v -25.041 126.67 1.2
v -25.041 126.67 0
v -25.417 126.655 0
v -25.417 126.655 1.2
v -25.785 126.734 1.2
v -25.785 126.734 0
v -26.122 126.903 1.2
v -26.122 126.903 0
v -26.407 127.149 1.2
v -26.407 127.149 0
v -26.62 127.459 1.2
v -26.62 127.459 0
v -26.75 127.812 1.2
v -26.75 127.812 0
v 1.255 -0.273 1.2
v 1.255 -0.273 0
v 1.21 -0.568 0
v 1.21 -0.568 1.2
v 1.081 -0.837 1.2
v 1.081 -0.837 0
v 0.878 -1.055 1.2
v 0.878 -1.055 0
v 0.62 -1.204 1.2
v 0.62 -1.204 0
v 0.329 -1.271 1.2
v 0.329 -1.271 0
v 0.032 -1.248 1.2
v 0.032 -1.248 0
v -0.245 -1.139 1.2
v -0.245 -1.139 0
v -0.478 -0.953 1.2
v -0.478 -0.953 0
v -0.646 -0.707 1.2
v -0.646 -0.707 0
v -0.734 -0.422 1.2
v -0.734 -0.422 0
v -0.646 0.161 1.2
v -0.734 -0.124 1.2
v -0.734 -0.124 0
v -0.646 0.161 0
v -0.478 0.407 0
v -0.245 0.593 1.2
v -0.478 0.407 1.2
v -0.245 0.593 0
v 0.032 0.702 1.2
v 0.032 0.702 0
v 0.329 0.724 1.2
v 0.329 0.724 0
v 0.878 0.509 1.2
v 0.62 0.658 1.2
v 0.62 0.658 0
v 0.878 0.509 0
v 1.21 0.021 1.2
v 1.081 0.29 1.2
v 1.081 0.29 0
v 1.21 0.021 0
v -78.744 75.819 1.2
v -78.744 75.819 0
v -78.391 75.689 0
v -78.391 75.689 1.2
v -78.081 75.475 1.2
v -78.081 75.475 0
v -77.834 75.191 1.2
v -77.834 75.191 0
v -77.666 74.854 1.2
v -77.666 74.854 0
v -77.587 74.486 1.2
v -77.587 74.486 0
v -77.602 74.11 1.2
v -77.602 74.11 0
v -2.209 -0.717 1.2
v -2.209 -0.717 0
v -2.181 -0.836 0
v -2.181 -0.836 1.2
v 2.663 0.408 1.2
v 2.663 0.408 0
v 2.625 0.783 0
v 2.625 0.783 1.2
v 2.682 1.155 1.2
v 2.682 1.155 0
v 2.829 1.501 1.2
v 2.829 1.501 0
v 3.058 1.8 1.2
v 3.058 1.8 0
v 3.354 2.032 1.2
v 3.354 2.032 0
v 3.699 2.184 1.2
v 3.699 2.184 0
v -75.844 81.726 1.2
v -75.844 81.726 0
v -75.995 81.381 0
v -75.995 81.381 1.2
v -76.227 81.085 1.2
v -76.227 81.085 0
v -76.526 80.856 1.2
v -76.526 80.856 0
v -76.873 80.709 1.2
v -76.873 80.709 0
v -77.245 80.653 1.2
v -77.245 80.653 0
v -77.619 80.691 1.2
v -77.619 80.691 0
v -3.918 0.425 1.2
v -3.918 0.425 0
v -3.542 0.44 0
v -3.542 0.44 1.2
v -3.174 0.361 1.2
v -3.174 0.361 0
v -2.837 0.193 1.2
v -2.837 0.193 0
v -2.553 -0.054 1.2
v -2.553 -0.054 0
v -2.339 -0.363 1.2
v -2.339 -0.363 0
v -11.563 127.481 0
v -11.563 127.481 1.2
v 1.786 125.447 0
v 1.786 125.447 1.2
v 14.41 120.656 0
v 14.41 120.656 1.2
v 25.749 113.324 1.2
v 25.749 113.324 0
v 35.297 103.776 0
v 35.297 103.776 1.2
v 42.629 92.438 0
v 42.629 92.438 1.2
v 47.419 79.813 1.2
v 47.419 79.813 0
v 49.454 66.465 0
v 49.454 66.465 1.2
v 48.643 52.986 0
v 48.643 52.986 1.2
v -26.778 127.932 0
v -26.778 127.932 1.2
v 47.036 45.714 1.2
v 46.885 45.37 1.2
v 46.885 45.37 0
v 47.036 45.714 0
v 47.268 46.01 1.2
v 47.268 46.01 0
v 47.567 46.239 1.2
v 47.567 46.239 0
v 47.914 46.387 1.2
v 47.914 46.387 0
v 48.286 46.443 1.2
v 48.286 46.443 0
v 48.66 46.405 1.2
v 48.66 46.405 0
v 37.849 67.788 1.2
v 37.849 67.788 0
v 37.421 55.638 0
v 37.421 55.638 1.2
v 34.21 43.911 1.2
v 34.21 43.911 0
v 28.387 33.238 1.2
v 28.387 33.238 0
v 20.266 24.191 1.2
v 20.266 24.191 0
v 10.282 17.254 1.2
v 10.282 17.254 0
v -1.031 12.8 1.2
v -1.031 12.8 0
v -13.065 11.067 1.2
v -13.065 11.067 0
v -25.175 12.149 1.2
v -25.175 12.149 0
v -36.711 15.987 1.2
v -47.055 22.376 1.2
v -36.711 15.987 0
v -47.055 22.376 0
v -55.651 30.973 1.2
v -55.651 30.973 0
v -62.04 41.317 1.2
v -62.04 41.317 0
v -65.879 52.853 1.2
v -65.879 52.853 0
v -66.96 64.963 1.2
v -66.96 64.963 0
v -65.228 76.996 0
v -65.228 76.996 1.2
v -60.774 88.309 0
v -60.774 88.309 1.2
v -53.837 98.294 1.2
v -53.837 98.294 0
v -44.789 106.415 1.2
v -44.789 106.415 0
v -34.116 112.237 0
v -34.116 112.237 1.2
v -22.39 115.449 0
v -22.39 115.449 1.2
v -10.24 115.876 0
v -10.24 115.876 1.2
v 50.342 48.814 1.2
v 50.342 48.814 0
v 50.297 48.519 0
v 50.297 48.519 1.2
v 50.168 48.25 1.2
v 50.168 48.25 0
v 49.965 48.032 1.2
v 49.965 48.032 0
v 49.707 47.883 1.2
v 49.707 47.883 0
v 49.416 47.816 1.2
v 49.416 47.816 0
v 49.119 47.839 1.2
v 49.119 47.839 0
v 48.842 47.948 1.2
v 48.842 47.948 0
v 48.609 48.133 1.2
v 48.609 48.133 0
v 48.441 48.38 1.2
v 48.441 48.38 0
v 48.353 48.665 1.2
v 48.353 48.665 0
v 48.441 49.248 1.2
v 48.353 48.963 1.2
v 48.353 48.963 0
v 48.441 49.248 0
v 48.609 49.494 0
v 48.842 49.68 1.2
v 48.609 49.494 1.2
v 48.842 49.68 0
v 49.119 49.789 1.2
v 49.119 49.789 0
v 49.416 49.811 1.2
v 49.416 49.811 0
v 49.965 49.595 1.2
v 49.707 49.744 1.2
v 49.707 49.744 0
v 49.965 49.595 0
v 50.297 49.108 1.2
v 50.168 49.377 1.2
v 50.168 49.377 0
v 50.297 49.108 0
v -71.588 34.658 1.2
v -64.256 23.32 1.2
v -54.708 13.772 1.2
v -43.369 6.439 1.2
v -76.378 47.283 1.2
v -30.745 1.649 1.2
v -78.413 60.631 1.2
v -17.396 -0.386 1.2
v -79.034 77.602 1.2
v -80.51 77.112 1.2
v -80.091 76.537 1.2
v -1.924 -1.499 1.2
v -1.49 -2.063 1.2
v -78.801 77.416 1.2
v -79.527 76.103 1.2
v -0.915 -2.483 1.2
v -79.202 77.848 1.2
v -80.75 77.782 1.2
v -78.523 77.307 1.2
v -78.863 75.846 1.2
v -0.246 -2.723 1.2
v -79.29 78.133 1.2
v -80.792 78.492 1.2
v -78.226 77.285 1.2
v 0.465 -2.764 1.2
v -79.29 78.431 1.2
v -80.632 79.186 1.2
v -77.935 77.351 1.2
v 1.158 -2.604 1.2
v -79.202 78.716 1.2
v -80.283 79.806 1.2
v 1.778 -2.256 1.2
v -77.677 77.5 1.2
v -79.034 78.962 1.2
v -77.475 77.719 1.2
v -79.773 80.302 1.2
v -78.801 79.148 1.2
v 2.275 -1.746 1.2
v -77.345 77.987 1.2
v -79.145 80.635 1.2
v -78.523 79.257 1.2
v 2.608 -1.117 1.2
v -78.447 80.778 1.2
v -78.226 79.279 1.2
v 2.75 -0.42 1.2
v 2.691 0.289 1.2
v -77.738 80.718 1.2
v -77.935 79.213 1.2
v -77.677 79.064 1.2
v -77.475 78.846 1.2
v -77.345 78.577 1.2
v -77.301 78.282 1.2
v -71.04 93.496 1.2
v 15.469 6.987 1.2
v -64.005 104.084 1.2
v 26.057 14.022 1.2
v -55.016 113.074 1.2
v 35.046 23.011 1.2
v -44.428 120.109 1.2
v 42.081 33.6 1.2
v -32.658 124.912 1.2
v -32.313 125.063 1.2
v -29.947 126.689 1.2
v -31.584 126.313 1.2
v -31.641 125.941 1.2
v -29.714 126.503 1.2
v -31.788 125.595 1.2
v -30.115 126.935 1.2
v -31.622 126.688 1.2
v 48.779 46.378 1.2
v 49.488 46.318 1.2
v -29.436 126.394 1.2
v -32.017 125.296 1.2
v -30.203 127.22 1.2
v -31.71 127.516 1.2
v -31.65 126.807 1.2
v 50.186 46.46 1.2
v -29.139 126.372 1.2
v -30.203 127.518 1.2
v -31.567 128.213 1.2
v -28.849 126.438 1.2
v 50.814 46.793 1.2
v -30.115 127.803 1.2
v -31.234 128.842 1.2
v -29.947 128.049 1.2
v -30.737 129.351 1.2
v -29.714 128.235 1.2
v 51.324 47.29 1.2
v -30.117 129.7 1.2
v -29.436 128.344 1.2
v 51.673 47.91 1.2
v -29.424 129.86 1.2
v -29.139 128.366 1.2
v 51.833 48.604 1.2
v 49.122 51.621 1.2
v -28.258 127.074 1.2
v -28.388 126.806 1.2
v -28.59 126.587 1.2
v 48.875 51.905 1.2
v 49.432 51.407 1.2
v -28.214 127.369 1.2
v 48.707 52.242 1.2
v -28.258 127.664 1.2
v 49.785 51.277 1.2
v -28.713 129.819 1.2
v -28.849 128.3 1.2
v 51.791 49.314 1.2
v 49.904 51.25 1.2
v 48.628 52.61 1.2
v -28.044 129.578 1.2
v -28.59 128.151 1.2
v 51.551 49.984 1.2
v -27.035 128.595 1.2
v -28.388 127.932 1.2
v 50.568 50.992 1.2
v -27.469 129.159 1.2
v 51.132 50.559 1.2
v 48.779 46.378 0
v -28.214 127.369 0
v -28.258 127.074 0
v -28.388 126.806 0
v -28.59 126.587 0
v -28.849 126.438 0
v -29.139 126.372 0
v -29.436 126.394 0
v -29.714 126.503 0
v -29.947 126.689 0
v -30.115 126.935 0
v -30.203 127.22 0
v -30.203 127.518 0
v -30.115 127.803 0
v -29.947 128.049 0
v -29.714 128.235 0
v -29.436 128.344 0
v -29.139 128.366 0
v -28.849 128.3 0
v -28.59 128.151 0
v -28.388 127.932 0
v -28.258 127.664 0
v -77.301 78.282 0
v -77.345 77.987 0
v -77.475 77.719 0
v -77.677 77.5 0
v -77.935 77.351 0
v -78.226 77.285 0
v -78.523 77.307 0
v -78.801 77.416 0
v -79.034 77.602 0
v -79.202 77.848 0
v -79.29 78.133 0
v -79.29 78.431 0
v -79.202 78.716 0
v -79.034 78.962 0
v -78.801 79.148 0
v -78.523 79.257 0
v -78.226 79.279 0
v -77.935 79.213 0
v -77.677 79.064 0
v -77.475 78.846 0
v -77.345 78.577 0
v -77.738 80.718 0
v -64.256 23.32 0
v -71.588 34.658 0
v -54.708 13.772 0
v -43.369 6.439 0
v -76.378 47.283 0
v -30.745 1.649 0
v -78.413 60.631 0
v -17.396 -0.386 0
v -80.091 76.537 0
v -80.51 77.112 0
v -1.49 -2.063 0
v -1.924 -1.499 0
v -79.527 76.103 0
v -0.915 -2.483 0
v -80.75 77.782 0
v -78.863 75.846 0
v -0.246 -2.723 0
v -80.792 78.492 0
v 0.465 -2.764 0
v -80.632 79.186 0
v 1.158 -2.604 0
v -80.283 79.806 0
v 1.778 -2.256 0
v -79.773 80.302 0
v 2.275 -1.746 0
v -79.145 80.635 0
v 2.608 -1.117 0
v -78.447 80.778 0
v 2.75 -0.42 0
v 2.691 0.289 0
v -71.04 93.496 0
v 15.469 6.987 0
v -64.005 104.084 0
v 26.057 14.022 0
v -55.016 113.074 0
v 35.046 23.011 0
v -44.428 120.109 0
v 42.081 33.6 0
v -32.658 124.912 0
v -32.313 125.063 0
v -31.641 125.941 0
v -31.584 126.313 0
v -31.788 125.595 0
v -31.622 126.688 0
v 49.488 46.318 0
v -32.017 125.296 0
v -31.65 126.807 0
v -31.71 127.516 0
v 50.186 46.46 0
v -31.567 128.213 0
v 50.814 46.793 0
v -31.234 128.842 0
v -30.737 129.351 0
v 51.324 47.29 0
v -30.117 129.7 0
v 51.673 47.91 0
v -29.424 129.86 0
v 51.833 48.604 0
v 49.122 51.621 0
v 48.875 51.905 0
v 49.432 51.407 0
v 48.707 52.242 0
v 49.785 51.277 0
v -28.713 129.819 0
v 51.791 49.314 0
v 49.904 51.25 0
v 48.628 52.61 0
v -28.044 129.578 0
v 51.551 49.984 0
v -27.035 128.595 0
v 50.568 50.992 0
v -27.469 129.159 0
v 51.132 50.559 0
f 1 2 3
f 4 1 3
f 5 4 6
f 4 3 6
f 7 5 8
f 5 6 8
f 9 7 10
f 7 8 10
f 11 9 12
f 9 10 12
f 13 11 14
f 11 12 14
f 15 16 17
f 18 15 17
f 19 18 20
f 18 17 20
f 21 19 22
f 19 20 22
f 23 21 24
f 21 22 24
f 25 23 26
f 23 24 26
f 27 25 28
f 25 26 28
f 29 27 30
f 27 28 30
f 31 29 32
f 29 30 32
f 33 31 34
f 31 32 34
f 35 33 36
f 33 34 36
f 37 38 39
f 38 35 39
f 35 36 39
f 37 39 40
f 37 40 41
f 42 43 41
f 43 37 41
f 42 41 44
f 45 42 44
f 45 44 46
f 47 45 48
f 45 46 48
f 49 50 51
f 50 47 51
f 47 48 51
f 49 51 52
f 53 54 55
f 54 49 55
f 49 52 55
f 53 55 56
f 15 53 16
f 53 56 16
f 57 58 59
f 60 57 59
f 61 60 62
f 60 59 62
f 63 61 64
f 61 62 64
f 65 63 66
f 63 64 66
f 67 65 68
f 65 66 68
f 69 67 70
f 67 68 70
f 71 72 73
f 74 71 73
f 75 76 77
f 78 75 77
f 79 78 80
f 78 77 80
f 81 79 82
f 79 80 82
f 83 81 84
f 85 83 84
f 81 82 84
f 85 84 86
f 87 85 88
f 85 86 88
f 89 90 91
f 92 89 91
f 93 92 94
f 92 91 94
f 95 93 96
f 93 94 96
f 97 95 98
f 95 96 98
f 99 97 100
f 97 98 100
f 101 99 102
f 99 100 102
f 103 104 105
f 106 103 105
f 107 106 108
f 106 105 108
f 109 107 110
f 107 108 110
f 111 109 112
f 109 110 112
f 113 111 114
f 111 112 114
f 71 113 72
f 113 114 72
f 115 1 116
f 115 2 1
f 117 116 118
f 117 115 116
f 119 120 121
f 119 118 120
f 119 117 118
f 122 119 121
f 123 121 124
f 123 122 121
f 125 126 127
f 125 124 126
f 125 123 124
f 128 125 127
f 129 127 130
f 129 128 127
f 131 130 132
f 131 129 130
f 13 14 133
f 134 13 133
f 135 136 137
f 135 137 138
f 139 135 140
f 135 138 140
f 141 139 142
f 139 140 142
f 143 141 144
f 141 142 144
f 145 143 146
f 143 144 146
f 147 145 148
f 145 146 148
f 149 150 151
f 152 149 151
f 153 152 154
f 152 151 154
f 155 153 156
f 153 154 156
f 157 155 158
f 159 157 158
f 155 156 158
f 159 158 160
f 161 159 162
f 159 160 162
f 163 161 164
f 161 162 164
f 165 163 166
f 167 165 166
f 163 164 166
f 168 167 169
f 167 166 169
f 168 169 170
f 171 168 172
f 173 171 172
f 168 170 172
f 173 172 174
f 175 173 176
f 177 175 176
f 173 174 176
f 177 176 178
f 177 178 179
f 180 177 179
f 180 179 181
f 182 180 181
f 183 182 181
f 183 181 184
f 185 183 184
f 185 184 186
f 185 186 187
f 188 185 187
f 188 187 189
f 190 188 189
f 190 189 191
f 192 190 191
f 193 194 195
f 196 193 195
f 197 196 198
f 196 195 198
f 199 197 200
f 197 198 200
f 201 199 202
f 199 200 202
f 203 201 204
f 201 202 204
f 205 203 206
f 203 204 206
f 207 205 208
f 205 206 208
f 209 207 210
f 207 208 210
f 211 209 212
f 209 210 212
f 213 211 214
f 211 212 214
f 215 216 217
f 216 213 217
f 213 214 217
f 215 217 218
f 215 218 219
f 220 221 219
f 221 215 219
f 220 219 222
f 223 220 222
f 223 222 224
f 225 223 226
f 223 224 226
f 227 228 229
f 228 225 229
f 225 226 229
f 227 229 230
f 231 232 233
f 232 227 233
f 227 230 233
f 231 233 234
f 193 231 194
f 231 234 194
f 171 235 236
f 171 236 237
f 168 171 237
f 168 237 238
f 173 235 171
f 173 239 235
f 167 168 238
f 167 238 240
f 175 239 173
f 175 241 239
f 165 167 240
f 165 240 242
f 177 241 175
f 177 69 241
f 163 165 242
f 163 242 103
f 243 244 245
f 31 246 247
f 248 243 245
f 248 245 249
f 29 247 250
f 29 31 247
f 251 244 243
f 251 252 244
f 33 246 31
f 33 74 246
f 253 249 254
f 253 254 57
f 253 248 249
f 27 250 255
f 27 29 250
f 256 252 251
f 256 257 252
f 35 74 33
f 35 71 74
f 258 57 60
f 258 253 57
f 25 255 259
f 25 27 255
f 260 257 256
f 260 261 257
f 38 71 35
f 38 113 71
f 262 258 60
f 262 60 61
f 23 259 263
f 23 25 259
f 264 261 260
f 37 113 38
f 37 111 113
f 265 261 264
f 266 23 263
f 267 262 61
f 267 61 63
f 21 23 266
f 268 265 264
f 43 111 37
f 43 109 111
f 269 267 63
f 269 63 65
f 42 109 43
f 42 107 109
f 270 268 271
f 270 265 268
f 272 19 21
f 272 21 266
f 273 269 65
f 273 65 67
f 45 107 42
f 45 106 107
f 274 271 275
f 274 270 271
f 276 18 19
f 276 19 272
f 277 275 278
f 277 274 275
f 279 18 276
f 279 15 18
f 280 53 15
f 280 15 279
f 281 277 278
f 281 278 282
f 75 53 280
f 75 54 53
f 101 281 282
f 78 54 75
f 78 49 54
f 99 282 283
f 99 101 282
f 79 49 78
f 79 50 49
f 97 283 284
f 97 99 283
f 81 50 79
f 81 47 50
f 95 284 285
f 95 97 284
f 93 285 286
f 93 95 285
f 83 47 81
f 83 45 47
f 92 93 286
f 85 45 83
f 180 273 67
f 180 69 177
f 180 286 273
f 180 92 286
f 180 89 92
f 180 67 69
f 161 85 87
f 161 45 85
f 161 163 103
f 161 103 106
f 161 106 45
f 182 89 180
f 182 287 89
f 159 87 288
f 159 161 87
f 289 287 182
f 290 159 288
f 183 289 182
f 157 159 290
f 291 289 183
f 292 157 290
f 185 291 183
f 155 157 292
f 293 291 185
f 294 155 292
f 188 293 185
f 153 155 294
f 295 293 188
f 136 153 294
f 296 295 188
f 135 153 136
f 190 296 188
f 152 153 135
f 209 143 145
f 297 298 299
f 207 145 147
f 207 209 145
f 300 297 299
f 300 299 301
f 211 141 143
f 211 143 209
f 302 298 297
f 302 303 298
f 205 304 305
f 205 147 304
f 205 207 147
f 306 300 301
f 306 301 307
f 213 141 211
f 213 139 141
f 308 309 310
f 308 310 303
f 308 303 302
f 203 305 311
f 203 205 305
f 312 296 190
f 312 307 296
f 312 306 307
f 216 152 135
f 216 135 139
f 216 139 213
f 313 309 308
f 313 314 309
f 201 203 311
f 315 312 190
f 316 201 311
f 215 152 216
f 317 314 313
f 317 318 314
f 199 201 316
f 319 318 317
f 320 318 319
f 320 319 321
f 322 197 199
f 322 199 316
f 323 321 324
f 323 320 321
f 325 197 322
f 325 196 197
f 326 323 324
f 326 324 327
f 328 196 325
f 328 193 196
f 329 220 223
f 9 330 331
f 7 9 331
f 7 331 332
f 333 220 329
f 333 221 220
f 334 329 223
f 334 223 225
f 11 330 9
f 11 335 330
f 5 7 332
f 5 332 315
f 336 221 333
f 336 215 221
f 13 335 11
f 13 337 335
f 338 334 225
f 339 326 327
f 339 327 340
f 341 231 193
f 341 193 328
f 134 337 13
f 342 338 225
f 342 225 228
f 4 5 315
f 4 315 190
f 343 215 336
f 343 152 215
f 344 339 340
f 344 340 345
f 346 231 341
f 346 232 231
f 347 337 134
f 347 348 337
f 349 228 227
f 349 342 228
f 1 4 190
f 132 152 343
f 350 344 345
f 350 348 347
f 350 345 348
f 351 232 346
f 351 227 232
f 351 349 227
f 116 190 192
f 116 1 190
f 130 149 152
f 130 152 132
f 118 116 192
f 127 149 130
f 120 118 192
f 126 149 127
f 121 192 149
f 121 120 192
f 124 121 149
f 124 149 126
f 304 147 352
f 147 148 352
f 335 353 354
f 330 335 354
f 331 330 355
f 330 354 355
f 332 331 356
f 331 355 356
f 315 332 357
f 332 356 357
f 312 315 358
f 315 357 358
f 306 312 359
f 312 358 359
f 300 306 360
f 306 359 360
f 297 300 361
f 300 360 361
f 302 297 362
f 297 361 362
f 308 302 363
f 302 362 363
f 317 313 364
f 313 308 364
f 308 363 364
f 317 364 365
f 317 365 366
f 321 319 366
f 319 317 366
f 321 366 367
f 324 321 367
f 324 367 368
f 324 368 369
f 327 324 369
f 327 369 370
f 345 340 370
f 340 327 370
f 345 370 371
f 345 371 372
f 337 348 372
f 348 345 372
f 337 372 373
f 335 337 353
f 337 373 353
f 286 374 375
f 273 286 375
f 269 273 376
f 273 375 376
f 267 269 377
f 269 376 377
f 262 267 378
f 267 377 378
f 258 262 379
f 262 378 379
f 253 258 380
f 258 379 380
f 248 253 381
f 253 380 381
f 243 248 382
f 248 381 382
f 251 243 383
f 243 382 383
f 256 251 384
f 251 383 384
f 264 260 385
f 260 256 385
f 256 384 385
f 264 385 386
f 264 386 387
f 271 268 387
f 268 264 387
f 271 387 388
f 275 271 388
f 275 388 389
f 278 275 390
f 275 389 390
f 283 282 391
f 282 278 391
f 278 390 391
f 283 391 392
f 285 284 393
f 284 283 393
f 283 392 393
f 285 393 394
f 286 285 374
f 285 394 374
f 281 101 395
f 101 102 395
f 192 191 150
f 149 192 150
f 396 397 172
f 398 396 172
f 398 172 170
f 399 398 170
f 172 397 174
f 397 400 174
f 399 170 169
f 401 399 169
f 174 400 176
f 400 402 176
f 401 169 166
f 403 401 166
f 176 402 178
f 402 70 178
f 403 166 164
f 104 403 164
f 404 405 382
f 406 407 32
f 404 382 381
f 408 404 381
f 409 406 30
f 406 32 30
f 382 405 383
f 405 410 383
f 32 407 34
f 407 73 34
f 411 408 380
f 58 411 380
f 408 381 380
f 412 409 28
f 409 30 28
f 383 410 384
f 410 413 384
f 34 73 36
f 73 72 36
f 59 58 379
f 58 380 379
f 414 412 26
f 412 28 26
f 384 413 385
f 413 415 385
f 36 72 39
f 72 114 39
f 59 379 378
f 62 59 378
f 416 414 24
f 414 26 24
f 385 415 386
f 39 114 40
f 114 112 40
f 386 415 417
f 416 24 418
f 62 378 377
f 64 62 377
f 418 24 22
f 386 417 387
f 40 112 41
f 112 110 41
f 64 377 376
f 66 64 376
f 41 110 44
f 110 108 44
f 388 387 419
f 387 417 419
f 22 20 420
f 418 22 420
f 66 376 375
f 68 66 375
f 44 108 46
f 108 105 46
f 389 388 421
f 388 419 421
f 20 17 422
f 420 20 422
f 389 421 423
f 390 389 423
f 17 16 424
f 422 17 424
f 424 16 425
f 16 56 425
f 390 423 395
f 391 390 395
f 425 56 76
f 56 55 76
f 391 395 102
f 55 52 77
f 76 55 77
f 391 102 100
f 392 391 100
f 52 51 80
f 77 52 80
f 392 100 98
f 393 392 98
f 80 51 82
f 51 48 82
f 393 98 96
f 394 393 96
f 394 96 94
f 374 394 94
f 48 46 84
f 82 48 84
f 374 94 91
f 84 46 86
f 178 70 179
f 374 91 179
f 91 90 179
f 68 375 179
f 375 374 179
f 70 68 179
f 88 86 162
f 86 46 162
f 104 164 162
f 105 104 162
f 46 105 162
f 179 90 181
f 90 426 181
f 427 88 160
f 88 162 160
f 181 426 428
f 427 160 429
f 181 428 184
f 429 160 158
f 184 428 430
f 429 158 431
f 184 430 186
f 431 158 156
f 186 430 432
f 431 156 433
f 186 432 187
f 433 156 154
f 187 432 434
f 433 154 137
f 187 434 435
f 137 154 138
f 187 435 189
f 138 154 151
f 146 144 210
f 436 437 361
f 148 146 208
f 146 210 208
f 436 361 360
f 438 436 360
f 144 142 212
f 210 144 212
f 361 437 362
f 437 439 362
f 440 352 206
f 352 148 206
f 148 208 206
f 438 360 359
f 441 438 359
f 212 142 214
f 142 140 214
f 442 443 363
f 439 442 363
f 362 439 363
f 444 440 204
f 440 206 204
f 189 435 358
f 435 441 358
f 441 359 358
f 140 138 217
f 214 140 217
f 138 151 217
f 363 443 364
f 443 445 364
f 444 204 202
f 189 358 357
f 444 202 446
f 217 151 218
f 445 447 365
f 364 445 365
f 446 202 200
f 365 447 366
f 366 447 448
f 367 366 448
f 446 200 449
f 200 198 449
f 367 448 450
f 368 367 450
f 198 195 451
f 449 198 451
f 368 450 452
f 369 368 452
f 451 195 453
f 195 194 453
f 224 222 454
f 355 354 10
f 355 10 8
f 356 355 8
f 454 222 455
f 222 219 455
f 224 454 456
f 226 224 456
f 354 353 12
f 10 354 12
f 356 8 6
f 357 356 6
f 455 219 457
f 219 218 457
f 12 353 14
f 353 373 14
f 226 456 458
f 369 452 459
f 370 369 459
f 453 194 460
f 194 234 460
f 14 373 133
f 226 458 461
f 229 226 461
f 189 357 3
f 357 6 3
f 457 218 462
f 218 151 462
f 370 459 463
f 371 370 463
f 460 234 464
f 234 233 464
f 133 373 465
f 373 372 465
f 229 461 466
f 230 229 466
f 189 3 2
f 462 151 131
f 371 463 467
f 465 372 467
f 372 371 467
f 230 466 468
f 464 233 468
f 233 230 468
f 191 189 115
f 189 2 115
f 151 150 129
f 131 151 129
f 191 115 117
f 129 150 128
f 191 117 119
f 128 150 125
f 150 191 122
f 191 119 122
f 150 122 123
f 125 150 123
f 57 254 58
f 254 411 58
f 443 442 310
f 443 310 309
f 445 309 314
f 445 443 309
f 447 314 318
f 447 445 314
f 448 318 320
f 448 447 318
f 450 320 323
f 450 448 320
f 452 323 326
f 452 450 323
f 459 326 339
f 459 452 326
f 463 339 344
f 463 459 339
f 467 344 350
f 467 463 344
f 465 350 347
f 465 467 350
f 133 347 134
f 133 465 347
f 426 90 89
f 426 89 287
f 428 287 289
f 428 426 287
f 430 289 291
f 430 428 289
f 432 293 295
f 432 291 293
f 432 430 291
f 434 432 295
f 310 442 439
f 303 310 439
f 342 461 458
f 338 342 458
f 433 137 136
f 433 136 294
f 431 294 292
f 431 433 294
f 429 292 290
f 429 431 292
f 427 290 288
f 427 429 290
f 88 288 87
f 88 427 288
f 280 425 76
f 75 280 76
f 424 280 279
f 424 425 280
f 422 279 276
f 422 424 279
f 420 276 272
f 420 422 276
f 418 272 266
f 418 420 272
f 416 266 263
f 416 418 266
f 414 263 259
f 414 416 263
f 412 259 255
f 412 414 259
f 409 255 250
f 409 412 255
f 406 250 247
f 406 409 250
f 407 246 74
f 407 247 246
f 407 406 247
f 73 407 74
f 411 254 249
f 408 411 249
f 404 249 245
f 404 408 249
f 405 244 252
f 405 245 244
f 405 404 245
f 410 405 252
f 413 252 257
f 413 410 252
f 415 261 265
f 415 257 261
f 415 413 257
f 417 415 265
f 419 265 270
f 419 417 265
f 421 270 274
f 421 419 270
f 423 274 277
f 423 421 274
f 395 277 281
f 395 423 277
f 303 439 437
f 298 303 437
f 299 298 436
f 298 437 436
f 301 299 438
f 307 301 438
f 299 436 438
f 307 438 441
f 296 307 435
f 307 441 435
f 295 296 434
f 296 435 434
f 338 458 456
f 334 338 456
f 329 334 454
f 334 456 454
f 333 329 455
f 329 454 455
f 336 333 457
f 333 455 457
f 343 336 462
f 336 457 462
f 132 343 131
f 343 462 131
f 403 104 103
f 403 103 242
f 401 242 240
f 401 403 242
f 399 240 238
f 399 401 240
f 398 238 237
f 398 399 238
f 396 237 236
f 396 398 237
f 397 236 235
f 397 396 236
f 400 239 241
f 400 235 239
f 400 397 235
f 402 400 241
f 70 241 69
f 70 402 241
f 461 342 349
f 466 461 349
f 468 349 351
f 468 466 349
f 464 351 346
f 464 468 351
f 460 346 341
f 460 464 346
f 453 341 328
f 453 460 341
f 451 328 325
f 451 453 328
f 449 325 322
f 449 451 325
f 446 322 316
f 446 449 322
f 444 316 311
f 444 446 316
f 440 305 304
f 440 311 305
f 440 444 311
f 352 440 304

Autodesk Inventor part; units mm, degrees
ref_plane "YZ Plane" through (0, 0, 0) normal (1, 0, 0) x (0, 1, 0)
ref_plane "XZ Plane" through (0, 0, 0) normal (0, 1, 0) x (-1, 0, 0)
ref_plane "作業平面1" through (0, 0, 0) normal (0, 0, 1) x (1, 0, 0)
sketch "スケッチ1" plane through (0, 0, 0) normal (0, 0, 1) x (1, 0, 0)
  circle A0 centre (-14.624772, 63.539385) radius 64
  arc A1 (-81.893775, 52.547912) -> (-80.479561, 53.962126) centre (-81.186668, 53.255019) ccw
  line L0 (-81.893775, 52.547912) -> (-83.065348, 52.547912)
  arc A2 (-84.479561, 53.962126) -> (-83.065348, 52.547912) centre (-83.772455, 53.255019) ccw
  line L1 (-84.479561, 53.962126) -> (-84.479561, 73.133699)
  arc A3 (-83.065348, 74.547912) -> (-84.479561, 73.133699) centre (-83.772455, 73.840806) ccw
  line L2 (-83.065348, 74.547912) -> (-81.893775, 74.547912)
  arc A4 (-80.479561, 73.133699) -> (-81.893775, 74.547912) centre (-81.186668, 73.840806) ccw
  line L3 (-80.479561, 73.133699) -> (-80.479561, 53.962126)
  arc A5 (-3.479561, 132.133699) -> (-4.893775, 133.547912) centre (-4.186668, 132.840806) ccw
  line L4 (-3.479561, 132.133699) -> (-3.479561, 130.962126)
  arc A6 (-4.893775, 129.547912) -> (-3.479561, 130.962126) centre (-4.186668, 130.255019) ccw
  line L5 (-4.893775, 129.547912) -> (-24.065348, 129.547912)
  arc A7 (-25.479561, 130.962126) -> (-24.065348, 129.547912) centre (-24.772455, 130.255019) ccw
  line L6 (-25.479561, 130.962126) -> (-25.479561, 132.133699)
  arc A8 (-24.065348, 133.547912) -> (-25.479561, 132.133699) centre (-24.772455, 132.840806) ccw
  line L7 (-24.065348, 133.547912) -> (-4.893775, 133.547912)
  arc A9 (54.106225, 52.547912) -> (55.520439, 53.962126) centre (54.813332, 53.255019) ccw
  line L8 (54.106225, 52.547912) -> (52.934652, 52.547912)
  arc A10 (51.520439, 53.962126) -> (52.934652, 52.547912) centre (52.227545, 53.255019) ccw
  line L9 (51.520439, 53.962126) -> (51.520439, 73.133699)
  arc A11 (52.934652, 74.547912) -> (51.520439, 73.133699) centre (52.227545, 73.840806) ccw
  line L10 (52.934652, 74.547912) -> (54.106225, 74.547912)
  arc A12 (55.520439, 73.133699) -> (54.106225, 74.547912) centre (54.813332, 73.840806) ccw
  line L11 (55.520439, 73.133699) -> (55.520439, 53.962126)
  arc A13 (-25.479561, -5.037874) -> (-24.065348, -6.452088) centre (-24.772455, -5.744981) ccw
  line L12 (-25.479561, -5.037874) -> (-25.479561, -3.866301)
  arc A14 (-24.065348, -2.452088) -> (-25.479561, -3.866301) centre (-24.772455, -3.159194) ccw
  line L13 (-24.065348, -2.452088) -> (-4.893775, -2.452088)
  arc A15 (-3.479561, -3.866301) -> (-4.893775, -2.452088) centre (-4.186668, -3.159194) ccw
  line L14 (-3.479561, -3.866301) -> (-3.479561, -5.037874)
  arc A16 (-4.893775, -6.452088) -> (-3.479561, -5.037874) centre (-4.186668, -5.744981) ccw
  line L15 (-4.893775, -6.452088) -> (-24.065348, -6.452088)
  arc A17 (-90.380937, 104.093949) -> (-92.776199, 103.718007) centre (-91.441598, 103.033289) ccw
  arc A18 (-92.776199, 103.718007) -> (-98.248191, 90.50745) centre (-14.479561, 63.547912) ccw
  arc A19 (-98.248191, 90.50745) -> (-96.820317, 88.547912) centre (-96.820317, 90.047912) ccw
  line L16 (-96.820317, 88.547912) -> (-88.479561, 88.547912)
  arc A20 (-86.479561, 86.547912) -> (-88.479561, 88.547912) centre (-88.479561, 86.547912) ccw
  line L17 (-86.479561, 86.547912) -> (-86.479561, 40.547912)
  arc A21 (-88.479561, 38.547912) -> (-86.479561, 40.547912) centre (-88.479561, 40.547912) ccw
  line L18 (-88.479561, 38.547912) -> (-96.820317, 38.547912)
  arc A22 (-96.820317, 38.547912) -> (-98.248191, 36.588375) centre (-96.820317, 37.047912) ccw
  arc A23 (-98.248191, 36.588375) -> (-41.439099, -20.220717) centre (-14.479561, 63.547912) ccw
  arc A24 (-41.439099, -20.220717) -> (-39.479561, -18.792843) centre (-40.979561, -18.792843) ccw
  line L19 (-39.479561, -18.792843) -> (-39.479561, -10.452088)
  arc A25 (-37.479561, -8.452088) -> (-39.479561, -10.452088) centre (-37.479561, -10.452088) ccw
  line L20 (-37.479561, -8.452088) -> (8.520439, -8.452088)
  arc A26 (10.520439, -10.452088) -> (8.520439, -8.452088) centre (8.520439, -10.452088) ccw
  line L21 (10.520439, -10.452088) -> (10.520439, -18.792843)
  arc A27 (10.520439, -18.792843) -> (12.479976, -20.220717) centre (12.020439, -18.792843) ccw
  arc A28 (12.479976, -20.220717) -> (25.690533, -14.748726) centre (-14.479561, 63.547912) ccw
  arc A29 (25.690533, -14.748726) -> (26.066476, -12.353464) centre (25.005815, -13.414124) ccw
  line L22 (26.066476, -12.353464) -> (20.079693, -6.366681)
  arc A30 (20.079693, -2.124041) -> (20.079693, -6.366681) centre (22.201014, -4.245361) ccw
  line L23 (25.736548, 3.532814) -> (45.535537, 23.331803)
  arc A31 (55.435032, 28.988658) -> (51.192392, 28.988658) centre (53.313712, 26.867337) ccw
  line L24 (55.435032, 28.988658) -> (61.421815, 23.001875)
  arc A32 (61.421815, 23.001875) -> (63.817077, 23.377818) centre (62.482475, 24.062536) ccw
  arc A33 (63.817077, 23.377818) -> (69.289068, 36.588375) centre (-14.479561, 63.547912) ccw
  arc A34 (69.289068, 36.588375) -> (67.861194, 38.547912) centre (67.861194, 37.047912) ccw
  line L25 (67.861194, 38.547912) -> (59.520439, 38.547912)
  arc A35 (57.520439, 40.547912) -> (59.520439, 38.547912) centre (59.520439, 40.547912) ccw
  line L26 (57.520439, 40.547912) -> (57.520439, 86.547912)
  arc A36 (59.520439, 88.547912) -> (57.520439, 86.547912) centre (59.520439, 86.547912) ccw
  line L27 (59.520439, 88.547912) -> (67.861194, 88.547912)
  arc A37 (67.861194, 88.547912) -> (69.289068, 90.50745) centre (67.861194, 90.047912) ccw
  arc A38 (69.289068, 90.50745) -> (12.479976, 147.316542) centre (-14.479561, 63.547912) ccw
  arc A39 (12.479976, 147.316542) -> (10.520439, 145.888668) centre (12.020439, 145.888668) ccw
  line L28 (10.520439, 145.888668) -> (10.520439, 137.547912)
  arc A40 (8.520439, 135.547912) -> (10.520439, 137.547912) centre (8.520439, 137.547912) ccw
  line L29 (8.520439, 135.547912) -> (-37.479561, 135.547912)
  arc A41 (-39.479561, 137.547912) -> (-37.479561, 135.547912) centre (-37.479561, 137.547912) ccw
  line L30 (-39.479561, 137.547912) -> (-39.479561, 145.888668)
  arc A42 (-39.479561, 145.888668) -> (-41.439099, 147.316542) centre (-40.979561, 145.888668) ccw
  arc A43 (-41.439099, 147.316542) -> (-54.649656, 141.84455) centre (-14.479561, 63.547912) ccw
  arc A44 (-54.649656, 141.84455) -> (-55.025598, 139.449288) centre (-53.964938, 140.509949) ccw
  line L31 (-55.025598, 139.449288) -> (-49.038816, 133.462506)
  arc A45 (-49.038816, 129.219865) -> (-49.038816, 133.462506) centre (-51.160136, 131.341186) ccw
  line L32 (-49.038816, 129.219865) -> (-51.160136, 127.098545)
  arc A46 (-84.394155, 98.107167) -> (-80.151514, 98.107167) centre (-82.272835, 100.228487) ccw
  line L33 (-84.394155, 98.107167) -> (-90.380937, 104.093949)
  arc A47 (-32.657783, 124.912008) -> (-31.62228, 126.687656) centre (-33.083835, 126.350229) ccw
  line L34 (-31.62228, 126.687656) -> (-31.649781, 126.806774)
  arc A48 (-26.77793, 127.931529) -> (-31.649781, 126.806774) centre (-29.213855, 127.369152) ccw
  line L35 (-26.77793, 127.931529) -> (-26.75043, 127.812411)
  arc A49 (-26.75043, 127.812411) -> (-25.041333, 126.670404) centre (-25.288875, 128.149838) ccw
  arc A50 (48.642931, 52.986141) -> (-25.041333, 126.670404) centre (-14.479561, 63.547912) ccw
  arc A51 (48.642931, 52.986141) -> (49.784937, 51.277044) centre (50.122364, 52.738599) ccw
  line L36 (49.784937, 51.277044) -> (49.904056, 51.249544)
  arc A52 (48.7793, 46.377693) -> (49.904056, 51.249544) centre (49.341678, 48.813618) ccw
  line L37 (48.7793, 46.377693) -> (48.660182, 46.405194)
  arc A53 (48.660182, 46.405194) -> (46.884535, 45.369691) centre (48.322756, 44.943639) ccw
  arc A54 (3.69866, 2.183817) -> (46.884535, 45.369691) centre (-14.479561, 63.547912) ccw
  arc A55 (3.69866, 2.183817) -> (2.663157, 0.408169) centre (4.124712, 0.745596) ccw
  line L38 (2.663157, 0.408169) -> (2.690658, 0.289051)
  arc A56 (-2.181192, -0.835704) -> (2.690658, 0.289051) centre (0.254733, -0.273327) ccw
  line L39 (-2.181192, -0.835704) -> (-2.208693, -0.716586)
  arc A57 (-2.208693, -0.716586) -> (-3.91779, 0.425421) centre (-3.670248, -1.054013) ccw
  arc A58 (-77.602053, 74.109684) -> (-3.91779, 0.425421) centre (-14.479561, 63.547912) ccw
  arc A59 (-77.602053, 74.109684) -> (-78.74406, 75.818781) centre (-79.081487, 74.357226) ccw
  line L40 (-78.74406, 75.818781) -> (-78.863178, 75.846281)
  arc A60 (-77.738423, 80.718132) -> (-78.863178, 75.846281) centre (-78.300801, 78.282206) ccw
  line L41 (-77.738423, 80.718132) -> (-77.619305, 80.690631)
  arc A61 (-77.619305, 80.690631) -> (-75.843657, 81.726134) centre (-77.281878, 82.152186) ccw
  arc A62 (-32.657783, 124.912008) -> (-75.843657, 81.726134) centre (-14.479561, 63.547912) ccw
  circle A63 centre (65.069166, 92.047912) radius 2.5
  circle A64 centre (-42.979561, -16.000815) radius 2.5
  circle A65 centre (14.020439, 143.09664) radius 2.5
  circle A66 centre (-94.028289, 35.047912) radius 2.5
  circle A67 centre (49.341678, 48.813618) radius 1
  circle A68 centre (0.254733, -0.273327) radius 1
  circle A69 centre (-78.300801, 78.282206) radius 1
  circle A70 centre (-29.213855, 127.369152) radius 1
  circle A71 centre (-14.479561, 63.547912) radius 52.5
  circle A72 centre (19.135053, 141.074087) radius 2
  circle A73 centre (63.046613, 97.162527) radius 2
  circle A74 centre (2.020439, 127.968406) radius 2
  circle A75 centre (49.940932, 80.047912) radius 2
  line L42 (-74.49466, 103.056915) -> (-72.019786, 100.582041)
  line L43 (-71.31268, 99.874934) -> (-74.141107, 97.046507)
  line L44 (-74.848214, 97.753614) -> (-77.323087, 100.228487)
  line L45 (-54.69567, 123.563011) -> (-74.49466, 103.764021)
  line L46 (-51.160136, 126.391438) -> (-48.685263, 123.916565)
  line L47 (-47.978156, 123.209458) -> (-50.806583, 120.381031)
  line L48 (-51.51369, 121.088137) -> (-53.988563, 123.563011)
  arc A76 (-47.978156, 123.209458) -> (-48.685263, 123.916565) centre (-48.331709, 123.563011) ccw
  arc A77 (-51.51369, 121.088137) -> (-50.806583, 120.381031) centre (-51.160136, 120.734584) ccw
  arc A78 (-71.31268, 99.874934) -> (-72.019786, 100.582041) centre (-71.666233, 100.228487) ccw
  arc A79 (-74.848214, 97.753614) -> (-74.141107, 97.046507) centre (-74.49466, 97.40006) ccw
  line L49 (-78.030194, 100.228487) -> (-80.151514, 98.107167)
  line L50 (22.201014, 0.704386) -> (19.72614, 3.17926)
  arc A80 (19.019033, 3.886367) -> (19.72614, 3.17926) centre (19.372587, 3.532814) ccw
  line L51 (19.019033, 3.886367) -> (21.84746, 6.714794)
  arc A81 (22.554567, 6.007687) -> (21.84746, 6.714794) centre (22.201014, 6.361241) ccw
  line L52 (22.554567, 6.007687) -> (25.029441, 3.532814)
  line L53 (49.071071, 26.867337) -> (51.192392, 28.988658)
  line L54 (45.535537, 24.03891) -> (43.060664, 26.513784)
  arc A82 (42.353557, 27.220891) -> (43.060664, 26.513784) centre (42.70711, 26.867337) ccw
  line L55 (42.353557, 27.220891) -> (45.181984, 30.049318)
  arc A83 (45.889091, 29.342211) -> (45.181984, 30.049318) centre (45.535537, 29.695765) ccw
  line L56 (45.889091, 29.342211) -> (48.363965, 26.867337)
  line L57 (20.079693, -2.124041) -> (22.201014, -0.00272)
  arc A84 (22.201014, -0.00272) -> (22.201014, 0.704386) centre (21.84746, 0.350833) ccw
  arc A85 (25.029441, 3.532814) -> (25.736548, 3.532814) centre (25.382994, 3.886367) ccw
  arc A86 (45.535537, 23.331803) -> (45.535537, 24.03891) centre (45.181984, 23.685357) ccw
  arc A87 (48.363965, 26.867337) -> (49.071071, 26.867337) centre (48.717518, 27.220891) ccw
  arc A88 (-51.160136, 127.098545) -> (-51.160136, 126.391438) centre (-50.806583, 126.744992) ccw
  arc A89 (-53.988563, 123.563011) -> (-54.69567, 123.563011) centre (-54.342117, 123.209458) ccw
  arc A90 (-74.49466, 103.764021) -> (-74.49466, 103.056915) centre (-74.141107, 103.410468) ccw
  arc A91 (-77.323087, 100.228487) -> (-78.030194, 100.228487) centre (-77.676641, 99.874934) ccw
  arc A92 (30.422034, 111.235402) -> (31.814662, 111.256349) centre (31.107555, 111.963456) ccw
  arc A93 (30.422034, 111.235402) -> (5.557839, 125.907776) centre (-14.479561, 63.547912) ccw
  arc A94 (4.902925, 127.136978) -> (5.557839, 125.907776) centre (5.863754, 126.859835) ccw
  arc A95 (4.902925, 127.136978) -> (2.020439, 130.968406) centre (2.020439, 127.968406) ccw
  line L58 (2.020439, 130.968406) -> (-0.686668, 130.968406)
  arc A96 (-1.686668, 131.968406) -> (-0.686668, 130.968406) centre (-0.686668, 131.968406) ccw
  line L59 (-1.686668, 131.968406) -> (-1.686668, 133.047912)
  arc A97 (-0.686668, 134.047912) -> (-1.686668, 133.047912) centre (-0.686668, 133.047912) ccw
  line L60 (-0.686668, 134.047912) -> (11.020439, 134.047912)
  arc A98 (11.020439, 134.047912) -> (12.020439, 135.047912) centre (11.020439, 135.047912) ccw
  line L61 (12.020439, 135.047912) -> (12.020439, 138.179207)
  arc A99 (13.302114, 139.138717) -> (12.020439, 138.179207) centre (13.020439, 138.179207) ccw
  line L62 (13.302114, 139.138717) -> (18.14919, 137.715802)
  arc A100 (18.14919, 137.715802) -> (22.557489, 140.341331) centre (19.135053, 141.074087) ccw
  arc A101 (23.979947, 141.027692) -> (22.557489, 140.341331) centre (23.535328, 140.131972) ccw
  arc A102 (45.237685, 126.126667) -> (23.979947, 141.027692) centre (-14.479561, 63.547912) ccw
  arc A103 (45.254419, 124.696106) -> (45.237685, 126.126667) centre (44.547312, 125.403213) ccw
  line L63 (45.254419, 124.696106) -> (31.814662, 111.256349)
  arc A104 (55.020439, 76.340806) -> (56.020439, 77.340806) centre (55.020439, 77.340806) ccw
  line L64 (55.020439, 76.340806) -> (53.940932, 76.340806)
  arc A105 (52.940932, 77.340806) -> (53.940932, 76.340806) centre (53.940932, 77.340806) ccw
  line L65 (52.940932, 77.340806) -> (52.940932, 80.047912)
  arc A106 (52.940932, 80.047912) -> (49.109504, 82.930399) centre (49.940932, 80.047912) ccw
  arc A107 (47.880302, 83.585313) -> (49.109504, 82.930399) centre (48.832361, 83.891227) ccw
  arc A108 (47.880302, 83.585313) -> (33.207929, 108.449508) centre (-14.479561, 63.547912) ccw
  arc A109 (33.228875, 109.842135) -> (33.207929, 108.449508) centre (33.935982, 109.135029) ccw
  line L66 (33.228875, 109.842135) -> (46.668632, 123.281893)
  arc A110 (48.099193, 123.265159) -> (46.668632, 123.281893) centre (47.375739, 122.574786) ccw
  arc A111 (63.000218, 102.00742) -> (48.099193, 123.265159) centre (-14.479561, 63.547912) ccw
  arc A112 (62.313857, 100.584963) -> (63.000218, 102.00742) centre (62.104498, 101.562802) ccw
  arc A113 (62.313857, 100.584963) -> (59.688329, 96.176664) centre (63.046613, 97.162527) ccw
  line L67 (59.688329, 96.176664) -> (61.111243, 91.329587)
  arc A114 (60.151733, 90.047912) -> (61.111243, 91.329587) centre (60.151733, 91.047912) ccw
  line L68 (60.151733, 90.047912) -> (57.020439, 90.047912)
  arc A115 (57.020439, 90.047912) -> (56.020439, 89.047912) centre (57.020439, 89.047912) ccw
  line L69 (56.020439, 89.047912) -> (56.020439, 77.340806)
  arc A116 (54.874372, 32.670638) -> (54.874372, 31.670638) centre (54.874372, 32.170638) ccw
  line L70 (54.874372, 32.670638) -> (56.702799, 34.499065)
  arc A117 (57.702799, 34.499065) -> (56.702799, 34.499065) centre (57.202799, 34.499065) ccw
  line L71 (57.702799, 34.499065) -> (62.359654, 29.842211)
  arc A118 (62.359654, 28.842211) -> (62.359654, 29.842211) centre (62.359654, 29.342211) ccw
  line L72 (62.359654, 28.842211) -> (60.531226, 27.013784)
  arc A119 (59.531226, 27.013784) -> (60.531226, 27.013784) centre (60.031226, 27.013784) ccw
  line L73 (59.531226, 27.013784) -> (54.874372, 31.670638)
  arc A120 (-86.661922, 92.596759) -> (-85.661922, 92.596759) centre (-86.161922, 92.596759) ccw
  line L74 (-86.661922, 92.596759) -> (-91.318776, 97.253614)
  arc A121 (-91.318776, 98.253614) -> (-91.318776, 97.253614) centre (-91.318776, 97.753614) ccw
  line L75 (-91.318776, 98.253614) -> (-89.490349, 100.082041)
  arc A122 (-88.490349, 100.082041) -> (-89.490349, 100.082041) centre (-88.990349, 100.082041) ccw
  line L76 (-88.490349, 100.082041) -> (-83.833495, 95.425187)
  arc A123 (-83.833495, 94.425187) -> (-83.833495, 95.425187) centre (-83.833495, 94.925187) ccw
  line L77 (-83.833495, 94.425187) -> (-85.661922, 92.596759)
  line L78 (19.22614, -13.291303) -> (14.569286, -8.634448)
  arc A124 (14.569286, -7.634448) -> (14.569286, -8.634448) centre (14.569286, -8.134448) ccw
  line L79 (14.569286, -7.634448) -> (16.397713, -5.806021)
  arc A125 (17.397713, -5.806021) -> (16.397713, -5.806021) centre (16.897713, -5.806021) ccw
  line L80 (17.397713, -5.806021) -> (22.054567, -10.462875)
  arc A126 (22.054567, -11.462875) -> (22.054567, -10.462875) centre (22.054567, -10.962875) ccw
  line L81 (22.054567, -11.462875) -> (20.22614, -13.291303)
  arc A127 (19.22614, -13.291303) -> (20.22614, -13.291303) centre (19.72614, -13.291303) ccw
  line L82 (-48.185263, 140.387127) -> (-43.528408, 135.730273)
  arc A128 (-43.528408, 134.730273) -> (-43.528408, 135.730273) centre (-43.528408, 135.230273) ccw
  line L83 (-43.528408, 134.730273) -> (-45.356835, 132.901846)
  arc A129 (-46.356835, 132.901846) -> (-45.356835, 132.901846) centre (-45.856835, 132.901846) ccw
  line L84 (-46.356835, 132.901846) -> (-51.01369, 137.5587)
  arc A130 (-51.01369, 138.5587) -> (-51.01369, 137.5587) centre (-51.01369, 138.0587) ccw
  line L85 (-51.01369, 138.5587) -> (-49.185263, 140.387127)
  arc A131 (-48.185263, 140.387127) -> (-49.185263, 140.387127) centre (-48.685263, 140.387127) ccw
  arc A132 (-1.686668, -5.952088) -> (-0.686668, -6.952088) centre (-0.686668, -5.952088) ccw
  line L86 (-1.686668, -5.952088) -> (-1.686668, -5.183904)
  arc A133 (-0.498388, -4.201788) -> (-1.686668, -5.183904) centre (-0.686668, -5.183904) ccw
  arc A134 (-0.498388, -4.201788) -> (4.246848, -0.022298) centre (0.254733, -0.273327) ccw
  arc A135 (4.948269, 0.995459) -> (4.246848, -0.022298) centre (5.244877, 0.04046) ccw
  arc A136 (4.948269, 0.995459) -> (14.374317, 4.74567) centre (-14.479561, 63.547912) ccw
  arc A137 (15.521941, 4.555032) -> (14.374317, 4.74567) centre (14.814834, 3.847926) ccw
  line L87 (15.521941, 4.555032) -> (19.372587, 0.704386)
  arc A138 (19.372587, -0.709827) -> (19.372587, 0.704386) centre (18.66548, -0.00272) ccw
  line L88 (19.372587, -0.709827) -> (13.423219, -6.659194)
  arc A139 (12.716112, -6.952088) -> (13.423219, -6.659194) centre (12.716112, -5.952088) ccw
  line L89 (12.716112, -6.952088) -> (-0.686668, -6.952088)
  arc A140 (-96.383203, 91.36955) -> (-95.43634, 90.047912) centre (-95.43634, 91.047912) ccw
  arc A141 (-94.512296, 96.365763) -> (-96.383203, 91.36955) centre (-14.479561, 63.547912) ccw
  arc A142 (-92.879956, 96.693473) -> (-94.512296, 96.365763) centre (-93.587062, 95.986366) ccw
  line L90 (-92.879956, 96.693473) -> (-87.941502, 91.755019)
  arc A143 (-88.648609, 90.047912) -> (-87.941502, 91.755019) centre (-88.648609, 91.047912) ccw
  line L91 (-88.648609, 90.047912) -> (-95.43634, 90.047912)
  arc A144 (-47.297412, 143.580647) -> (-47.625122, 141.948307) centre (-46.918015, 142.655414) ccw
  arc A145 (-42.301199, 145.451554) -> (-47.297412, 143.580647) centre (-14.479561, 63.547912) ccw
  arc A146 (-40.979561, 144.504691) -> (-42.301199, 145.451554) centre (-41.979561, 144.504691) ccw
  line L92 (-40.979561, 144.504691) -> (-40.979561, 137.71696)
  arc A147 (-42.686668, 137.009853) -> (-40.979561, 137.71696) centre (-41.979561, 137.71696) ccw
  line L93 (-42.686668, 137.009853) -> (-47.625122, 141.948307)
  arc A148 (67.42408, 35.726275) -> (66.477217, 37.047912) centre (66.477217, 36.047912) ccw
  arc A149 (65.553174, 30.730062) -> (67.42408, 35.726275) centre (-14.479561, 63.547912) ccw
  arc A150 (63.920833, 30.402352) -> (65.553174, 30.730062) centre (64.62794, 31.109459) ccw
  line L94 (63.920833, 30.402352) -> (58.982379, 35.340806)
  arc A151 (59.689486, 37.047912) -> (58.982379, 35.340806) centre (59.689486, 36.047912) ccw
  line L95 (59.689486, 37.047912) -> (66.477217, 37.047912)
  arc A152 (18.338289, -16.484823) -> (18.665999, -14.852482) centre (17.958892, -15.559589) ccw
  arc A153 (13.342076, -18.355729) -> (18.338289, -16.484823) centre (-14.479561, 63.547912) ccw
  arc A154 (12.020439, -17.408866) -> (13.342076, -18.355729) centre (13.020439, -17.408866) ccw
  line L96 (12.020439, -17.408866) -> (12.020439, -10.621135)
  arc A155 (13.727545, -9.914028) -> (12.020439, -10.621135) centre (13.020439, -10.621135) ccw
  line L97 (13.727545, -9.914028) -> (18.665999, -14.852482)
  arc A156 (-77.323087, 97.40006) -> (-78.737301, 97.40006) centre (-78.030194, 96.692954) ccw
  line L98 (-77.323087, 97.40006) -> (-73.472441, 93.549414)
  arc A157 (-73.281804, 92.40179) -> (-73.472441, 93.549414) centre (-74.179548, 92.842308) ccw
  arc A158 (-73.281804, 92.40179) -> (-77.032015, 82.975742) centre (-14.479561, 63.547912) ccw
  arc A159 (-78.049771, 82.274322) -> (-77.032015, 82.975742) centre (-77.987014, 83.272351) ccw
  arc A160 (-78.049771, 82.274322) -> (-82.229262, 77.529086) centre (-78.300801, 78.282206) ccw
  arc A161 (-83.211377, 76.340806) -> (-82.229262, 77.529086) centre (-83.211377, 77.340806) ccw
  line L99 (-83.211377, 76.340806) -> (-83.979561, 76.340806)
  arc A162 (-84.979561, 77.340806) -> (-83.979561, 76.340806) centre (-83.979561, 77.340806) ccw
  line L100 (-84.979561, 77.340806) -> (-84.979561, 90.743586)
  arc A163 (-84.686668, 91.450693) -> (-84.979561, 90.743586) centre (-83.979561, 90.743586) ccw
  line L101 (-84.686668, 91.450693) -> (-78.737301, 97.40006)
  arc A164 (-27.272455, 133.047912) -> (-28.272455, 134.047912) centre (-28.272455, 133.047912) ccw
  line L102 (-27.272455, 133.047912) -> (-27.272455, 132.279728)
  arc A165 (-28.460735, 131.297613) -> (-27.272455, 132.279728) centre (-28.272455, 132.279728) ccw
  arc A166 (-28.460735, 131.297613) -> (-33.205971, 127.118122) centre (-29.213855, 127.369152) ccw
  arc A167 (-33.907391, 126.100366) -> (-33.205971, 127.118122) centre (-34.203999, 127.055365) ccw
  arc A168 (-33.907391, 126.100366) -> (-43.333439, 122.350155) centre (-14.479561, 63.547912) ccw
  arc A169 (-44.481063, 122.540792) -> (-43.333439, 122.350155) centre (-43.773956, 123.247899) ccw
  line L103 (-44.481063, 122.540792) -> (-48.331709, 126.391438)
  arc A170 (-48.331709, 127.805652) -> (-48.331709, 126.391438) centre (-47.624602, 127.098545) ccw
  line L104 (-48.331709, 127.805652) -> (-42.382342, 133.755019)
  arc A171 (-41.675235, 134.047912) -> (-42.382342, 133.755019) centre (-41.675235, 133.047912) ccw
  line L105 (-41.675235, 134.047912) -> (-28.272455, 134.047912)
  line L106 (55.727545, 35.645132) -> (49.778178, 29.695765)
  arc A172 (48.363965, 29.695765) -> (49.778178, 29.695765) centre (49.071071, 30.402871) ccw
  line L107 (48.363965, 29.695765) -> (44.513319, 33.54641)
  arc A173 (44.322681, 34.694034) -> (44.513319, 33.54641) centre (45.220425, 34.253517) ccw
  arc A174 (44.322681, 34.694034) -> (48.072892, 44.120082) centre (-14.479561, 63.547912) ccw
  arc A175 (49.090649, 44.821503) -> (48.072892, 44.120082) centre (49.027891, 43.823474) ccw
  arc A176 (49.090649, 44.821503) -> (53.270139, 49.566739) centre (49.341678, 48.813618) ccw
  arc A177 (54.252255, 50.755019) -> (53.270139, 49.566739) centre (54.252255, 49.755019) ccw
  line L108 (54.252255, 50.755019) -> (55.020439, 50.755019)
  arc A178 (56.020439, 49.755019) -> (55.020439, 50.755019) centre (55.020439, 49.755019) ccw
  line L109 (56.020439, 49.755019) -> (56.020439, 36.352239)
  arc A179 (55.727545, 35.645132) -> (56.020439, 36.352239) centre (55.020439, 36.352239) ccw
  arc A180 (-77.058316, 3.830666) -> (-75.627755, 3.813932) centre (-76.334862, 4.521039) ccw
  arc A181 (-91.959341, 25.088404) -> (-77.058316, 3.830666) centre (-14.479561, 63.547912) ccw
  arc A182 (-91.27298, 26.510862) -> (-91.959341, 25.088404) centre (-91.063621, 25.533023) ccw
  arc A183 (-91.27298, 26.510862) -> (-88.647451, 30.919161) centre (-92.005736, 29.933298) ccw
  line L110 (-88.647451, 30.919161) -> (-90.070366, 35.766237)
  arc A184 (-89.110856, 37.047912) -> (-90.070366, 35.766237) centre (-89.110856, 36.047912) ccw
  line L111 (-89.110856, 37.047912) -> (-85.979561, 37.047912)
  arc A185 (-85.979561, 37.047912) -> (-84.979561, 38.047912) centre (-85.979561, 38.047912) ccw
  line L112 (-84.979561, 38.047912) -> (-84.979561, 49.755019)
  arc A186 (-83.979561, 50.755019) -> (-84.979561, 49.755019) centre (-83.979561, 49.755019) ccw
  line L113 (-83.979561, 50.755019) -> (-82.900055, 50.755019)
  arc A187 (-81.900055, 49.755019) -> (-82.900055, 50.755019) centre (-82.900055, 49.755019) ccw
  line L114 (-81.900055, 49.755019) -> (-81.900055, 47.047912)
  arc A188 (-81.900055, 47.047912) -> (-78.068627, 44.165426) centre (-78.900055, 47.047912) ccw
  arc A189 (-76.839425, 43.510512) -> (-78.068627, 44.165426) centre (-77.791484, 43.204597) ccw
  arc A190 (-76.839425, 43.510512) -> (-62.167051, 18.646317) centre (-14.479561, 63.547912) ccw
  arc A191 (-62.187998, 17.253689) -> (-62.167051, 18.646317) centre (-62.895105, 17.960796) ccw
  line L115 (-62.187998, 17.253689) -> (-75.627755, 3.813932)
  arc A192 (-33.862048, -0.041153) -> (-30.979561, -3.872581) centre (-30.979561, -0.872581) ccw
  line L116 (-30.979561, -3.872581) -> (-28.272455, -3.872581)
  arc A193 (-27.272455, -4.872581) -> (-28.272455, -3.872581) centre (-28.272455, -4.872581) ccw
  line L117 (-27.272455, -4.872581) -> (-27.272455, -5.952088)
  arc A194 (-28.272455, -6.952088) -> (-27.272455, -5.952088) centre (-28.272455, -5.952088) ccw
  line L118 (-28.272455, -6.952088) -> (-39.979561, -6.952088)
  arc A195 (-39.979561, -6.952088) -> (-40.979561, -7.952088) centre (-39.979561, -7.952088) ccw
  line L119 (-40.979561, -7.952088) -> (-40.979561, -11.083382)
  arc A196 (-42.261236, -12.042892) -> (-40.979561, -11.083382) centre (-41.979561, -11.083382) ccw
  line L120 (-42.261236, -12.042892) -> (-47.108313, -10.619977)
  arc A197 (-47.108313, -10.619977) -> (-51.516612, -13.245506) centre (-48.094176, -13.978262) ccw
  arc A198 (-52.939069, -13.931867) -> (-51.516612, -13.245506) centre (-52.494451, -13.036147) ccw
  arc A199 (-74.196808, 0.969158) -> (-52.939069, -13.931867) centre (-14.479561, 63.547912) ccw
  arc A200 (-74.213542, 2.399719) -> (-74.196808, 0.969158) centre (-73.506435, 1.692612) ccw
  line L121 (-74.213542, 2.399719) -> (-60.773784, 15.839476)
  arc A201 (-59.381157, 15.860422) -> (-60.773784, 15.839476) centre (-60.066678, 15.132369) ccw
  arc A202 (-59.381157, 15.860422) -> (-34.516962, 1.188049) centre (-14.479561, 63.547912) ccw
  arc A203 (-33.862048, -0.041153) -> (-34.516962, 1.188049) centre (-34.822876, 0.23599) ccw
  line L122 (-10.23952, 115.876414) -> (37.84894, 67.787954)
  line L123 (-64.595165, 113.663516) -> (35.636043, 13.432309) construction
  point P0 (0, 0)
  point P1 (30.775273, 108.802746)
  dimension "d0" = 2
  dimension "d3" = 105
  dimension "d4" = 24
sketch "スケッチ1 outline for 押し出し1" plane through (0, 0, 0) normal (0, 0, 1) x (1, 0, 0)
  line L0 (-78.863178, 75.846281) -> (-78.74406, 75.818781)
  arc A0 (-78.74406, 75.818781) -> (-77.602053, 74.109684) centre (-79.081487, 74.357226) cw
  arc A1 (-77.602053, 74.109684) -> (-3.91779, 0.425421) centre (-14.479561, 63.547912) ccw
  arc A2 (-3.91779, 0.425421) -> (-2.208693, -0.716586) centre (-3.670248, -1.054013) cw
  line L1 (-2.208693, -0.716586) -> (-2.181192, -0.835704)
  arc A3 (-2.181192, -0.835704) -> (2.690658, 0.289051) centre (0.254733, -0.273327) ccw
  line L2 (2.690658, 0.289051) -> (2.663157, 0.408169)
  arc A4 (2.663157, 0.408169) -> (3.69866, 2.183817) centre (4.124712, 0.745596) cw
  arc A5 (3.69866, 2.183817) -> (46.884535, 45.369691) centre (-14.479561, 63.547912) ccw
  arc A6 (46.884535, 45.369691) -> (48.660182, 46.405194) centre (48.322756, 44.943639) cw
  line L3 (48.660182, 46.405194) -> (48.7793, 46.377693)
  arc A7 (48.7793, 46.377693) -> (49.904056, 51.249544) centre (49.341678, 48.813618) ccw
  line L4 (49.904056, 51.249544) -> (49.784937, 51.277044)
  arc A8 (49.784937, 51.277044) -> (48.642931, 52.986141) centre (50.122364, 52.738599) cw
  arc A9 (48.642931, 52.986141) -> (-25.041333, 126.670404) centre (-14.479561, 63.547912) ccw
  arc A10 (-25.041333, 126.670404) -> (-26.75043, 127.812411) centre (-25.288875, 128.149838) cw
  line L5 (-26.75043, 127.812411) -> (-26.77793, 127.931529)
  arc A11 (-26.77793, 127.931529) -> (-31.649781, 126.806774) centre (-29.213855, 127.369152) ccw
  line L6 (-31.649781, 126.806774) -> (-31.62228, 126.687656)
  arc A12 (-31.62228, 126.687656) -> (-32.657783, 124.912008) centre (-33.083835, 126.350229) cw
  arc A13 (-32.657783, 124.912008) -> (-75.843657, 81.726134) centre (-14.479561, 63.547912) ccw
  arc A14 (-75.843657, 81.726134) -> (-77.619305, 80.690631) centre (-77.281878, 82.152186) cw
  line L7 (-77.619305, 80.690631) -> (-77.738423, 80.718132)
  arc A15 (-77.738423, 80.718132) -> (-78.863178, 75.846281) centre (-78.300801, 78.282206) ccw
  circle A16 centre (0.254733, -0.273327) radius 1
  arc A17 (37.84894, 67.787954) -> (-10.23952, 115.876414) centre (-14.479561, 63.547912) cw
  line L8 (-10.23952, 115.876414) -> (37.84894, 67.787954)
  circle A18 centre (49.341678, 48.813618) radius 1
  circle A19 centre (-78.300801, 78.282206) radius 1
  circle A20 centre (-29.213855, 127.369152) radius 1
extrude "押し出し1" add sketch "スケッチ1 outline for 押し出し1" along normal blind 1.2
properties part number "LineSensor"
